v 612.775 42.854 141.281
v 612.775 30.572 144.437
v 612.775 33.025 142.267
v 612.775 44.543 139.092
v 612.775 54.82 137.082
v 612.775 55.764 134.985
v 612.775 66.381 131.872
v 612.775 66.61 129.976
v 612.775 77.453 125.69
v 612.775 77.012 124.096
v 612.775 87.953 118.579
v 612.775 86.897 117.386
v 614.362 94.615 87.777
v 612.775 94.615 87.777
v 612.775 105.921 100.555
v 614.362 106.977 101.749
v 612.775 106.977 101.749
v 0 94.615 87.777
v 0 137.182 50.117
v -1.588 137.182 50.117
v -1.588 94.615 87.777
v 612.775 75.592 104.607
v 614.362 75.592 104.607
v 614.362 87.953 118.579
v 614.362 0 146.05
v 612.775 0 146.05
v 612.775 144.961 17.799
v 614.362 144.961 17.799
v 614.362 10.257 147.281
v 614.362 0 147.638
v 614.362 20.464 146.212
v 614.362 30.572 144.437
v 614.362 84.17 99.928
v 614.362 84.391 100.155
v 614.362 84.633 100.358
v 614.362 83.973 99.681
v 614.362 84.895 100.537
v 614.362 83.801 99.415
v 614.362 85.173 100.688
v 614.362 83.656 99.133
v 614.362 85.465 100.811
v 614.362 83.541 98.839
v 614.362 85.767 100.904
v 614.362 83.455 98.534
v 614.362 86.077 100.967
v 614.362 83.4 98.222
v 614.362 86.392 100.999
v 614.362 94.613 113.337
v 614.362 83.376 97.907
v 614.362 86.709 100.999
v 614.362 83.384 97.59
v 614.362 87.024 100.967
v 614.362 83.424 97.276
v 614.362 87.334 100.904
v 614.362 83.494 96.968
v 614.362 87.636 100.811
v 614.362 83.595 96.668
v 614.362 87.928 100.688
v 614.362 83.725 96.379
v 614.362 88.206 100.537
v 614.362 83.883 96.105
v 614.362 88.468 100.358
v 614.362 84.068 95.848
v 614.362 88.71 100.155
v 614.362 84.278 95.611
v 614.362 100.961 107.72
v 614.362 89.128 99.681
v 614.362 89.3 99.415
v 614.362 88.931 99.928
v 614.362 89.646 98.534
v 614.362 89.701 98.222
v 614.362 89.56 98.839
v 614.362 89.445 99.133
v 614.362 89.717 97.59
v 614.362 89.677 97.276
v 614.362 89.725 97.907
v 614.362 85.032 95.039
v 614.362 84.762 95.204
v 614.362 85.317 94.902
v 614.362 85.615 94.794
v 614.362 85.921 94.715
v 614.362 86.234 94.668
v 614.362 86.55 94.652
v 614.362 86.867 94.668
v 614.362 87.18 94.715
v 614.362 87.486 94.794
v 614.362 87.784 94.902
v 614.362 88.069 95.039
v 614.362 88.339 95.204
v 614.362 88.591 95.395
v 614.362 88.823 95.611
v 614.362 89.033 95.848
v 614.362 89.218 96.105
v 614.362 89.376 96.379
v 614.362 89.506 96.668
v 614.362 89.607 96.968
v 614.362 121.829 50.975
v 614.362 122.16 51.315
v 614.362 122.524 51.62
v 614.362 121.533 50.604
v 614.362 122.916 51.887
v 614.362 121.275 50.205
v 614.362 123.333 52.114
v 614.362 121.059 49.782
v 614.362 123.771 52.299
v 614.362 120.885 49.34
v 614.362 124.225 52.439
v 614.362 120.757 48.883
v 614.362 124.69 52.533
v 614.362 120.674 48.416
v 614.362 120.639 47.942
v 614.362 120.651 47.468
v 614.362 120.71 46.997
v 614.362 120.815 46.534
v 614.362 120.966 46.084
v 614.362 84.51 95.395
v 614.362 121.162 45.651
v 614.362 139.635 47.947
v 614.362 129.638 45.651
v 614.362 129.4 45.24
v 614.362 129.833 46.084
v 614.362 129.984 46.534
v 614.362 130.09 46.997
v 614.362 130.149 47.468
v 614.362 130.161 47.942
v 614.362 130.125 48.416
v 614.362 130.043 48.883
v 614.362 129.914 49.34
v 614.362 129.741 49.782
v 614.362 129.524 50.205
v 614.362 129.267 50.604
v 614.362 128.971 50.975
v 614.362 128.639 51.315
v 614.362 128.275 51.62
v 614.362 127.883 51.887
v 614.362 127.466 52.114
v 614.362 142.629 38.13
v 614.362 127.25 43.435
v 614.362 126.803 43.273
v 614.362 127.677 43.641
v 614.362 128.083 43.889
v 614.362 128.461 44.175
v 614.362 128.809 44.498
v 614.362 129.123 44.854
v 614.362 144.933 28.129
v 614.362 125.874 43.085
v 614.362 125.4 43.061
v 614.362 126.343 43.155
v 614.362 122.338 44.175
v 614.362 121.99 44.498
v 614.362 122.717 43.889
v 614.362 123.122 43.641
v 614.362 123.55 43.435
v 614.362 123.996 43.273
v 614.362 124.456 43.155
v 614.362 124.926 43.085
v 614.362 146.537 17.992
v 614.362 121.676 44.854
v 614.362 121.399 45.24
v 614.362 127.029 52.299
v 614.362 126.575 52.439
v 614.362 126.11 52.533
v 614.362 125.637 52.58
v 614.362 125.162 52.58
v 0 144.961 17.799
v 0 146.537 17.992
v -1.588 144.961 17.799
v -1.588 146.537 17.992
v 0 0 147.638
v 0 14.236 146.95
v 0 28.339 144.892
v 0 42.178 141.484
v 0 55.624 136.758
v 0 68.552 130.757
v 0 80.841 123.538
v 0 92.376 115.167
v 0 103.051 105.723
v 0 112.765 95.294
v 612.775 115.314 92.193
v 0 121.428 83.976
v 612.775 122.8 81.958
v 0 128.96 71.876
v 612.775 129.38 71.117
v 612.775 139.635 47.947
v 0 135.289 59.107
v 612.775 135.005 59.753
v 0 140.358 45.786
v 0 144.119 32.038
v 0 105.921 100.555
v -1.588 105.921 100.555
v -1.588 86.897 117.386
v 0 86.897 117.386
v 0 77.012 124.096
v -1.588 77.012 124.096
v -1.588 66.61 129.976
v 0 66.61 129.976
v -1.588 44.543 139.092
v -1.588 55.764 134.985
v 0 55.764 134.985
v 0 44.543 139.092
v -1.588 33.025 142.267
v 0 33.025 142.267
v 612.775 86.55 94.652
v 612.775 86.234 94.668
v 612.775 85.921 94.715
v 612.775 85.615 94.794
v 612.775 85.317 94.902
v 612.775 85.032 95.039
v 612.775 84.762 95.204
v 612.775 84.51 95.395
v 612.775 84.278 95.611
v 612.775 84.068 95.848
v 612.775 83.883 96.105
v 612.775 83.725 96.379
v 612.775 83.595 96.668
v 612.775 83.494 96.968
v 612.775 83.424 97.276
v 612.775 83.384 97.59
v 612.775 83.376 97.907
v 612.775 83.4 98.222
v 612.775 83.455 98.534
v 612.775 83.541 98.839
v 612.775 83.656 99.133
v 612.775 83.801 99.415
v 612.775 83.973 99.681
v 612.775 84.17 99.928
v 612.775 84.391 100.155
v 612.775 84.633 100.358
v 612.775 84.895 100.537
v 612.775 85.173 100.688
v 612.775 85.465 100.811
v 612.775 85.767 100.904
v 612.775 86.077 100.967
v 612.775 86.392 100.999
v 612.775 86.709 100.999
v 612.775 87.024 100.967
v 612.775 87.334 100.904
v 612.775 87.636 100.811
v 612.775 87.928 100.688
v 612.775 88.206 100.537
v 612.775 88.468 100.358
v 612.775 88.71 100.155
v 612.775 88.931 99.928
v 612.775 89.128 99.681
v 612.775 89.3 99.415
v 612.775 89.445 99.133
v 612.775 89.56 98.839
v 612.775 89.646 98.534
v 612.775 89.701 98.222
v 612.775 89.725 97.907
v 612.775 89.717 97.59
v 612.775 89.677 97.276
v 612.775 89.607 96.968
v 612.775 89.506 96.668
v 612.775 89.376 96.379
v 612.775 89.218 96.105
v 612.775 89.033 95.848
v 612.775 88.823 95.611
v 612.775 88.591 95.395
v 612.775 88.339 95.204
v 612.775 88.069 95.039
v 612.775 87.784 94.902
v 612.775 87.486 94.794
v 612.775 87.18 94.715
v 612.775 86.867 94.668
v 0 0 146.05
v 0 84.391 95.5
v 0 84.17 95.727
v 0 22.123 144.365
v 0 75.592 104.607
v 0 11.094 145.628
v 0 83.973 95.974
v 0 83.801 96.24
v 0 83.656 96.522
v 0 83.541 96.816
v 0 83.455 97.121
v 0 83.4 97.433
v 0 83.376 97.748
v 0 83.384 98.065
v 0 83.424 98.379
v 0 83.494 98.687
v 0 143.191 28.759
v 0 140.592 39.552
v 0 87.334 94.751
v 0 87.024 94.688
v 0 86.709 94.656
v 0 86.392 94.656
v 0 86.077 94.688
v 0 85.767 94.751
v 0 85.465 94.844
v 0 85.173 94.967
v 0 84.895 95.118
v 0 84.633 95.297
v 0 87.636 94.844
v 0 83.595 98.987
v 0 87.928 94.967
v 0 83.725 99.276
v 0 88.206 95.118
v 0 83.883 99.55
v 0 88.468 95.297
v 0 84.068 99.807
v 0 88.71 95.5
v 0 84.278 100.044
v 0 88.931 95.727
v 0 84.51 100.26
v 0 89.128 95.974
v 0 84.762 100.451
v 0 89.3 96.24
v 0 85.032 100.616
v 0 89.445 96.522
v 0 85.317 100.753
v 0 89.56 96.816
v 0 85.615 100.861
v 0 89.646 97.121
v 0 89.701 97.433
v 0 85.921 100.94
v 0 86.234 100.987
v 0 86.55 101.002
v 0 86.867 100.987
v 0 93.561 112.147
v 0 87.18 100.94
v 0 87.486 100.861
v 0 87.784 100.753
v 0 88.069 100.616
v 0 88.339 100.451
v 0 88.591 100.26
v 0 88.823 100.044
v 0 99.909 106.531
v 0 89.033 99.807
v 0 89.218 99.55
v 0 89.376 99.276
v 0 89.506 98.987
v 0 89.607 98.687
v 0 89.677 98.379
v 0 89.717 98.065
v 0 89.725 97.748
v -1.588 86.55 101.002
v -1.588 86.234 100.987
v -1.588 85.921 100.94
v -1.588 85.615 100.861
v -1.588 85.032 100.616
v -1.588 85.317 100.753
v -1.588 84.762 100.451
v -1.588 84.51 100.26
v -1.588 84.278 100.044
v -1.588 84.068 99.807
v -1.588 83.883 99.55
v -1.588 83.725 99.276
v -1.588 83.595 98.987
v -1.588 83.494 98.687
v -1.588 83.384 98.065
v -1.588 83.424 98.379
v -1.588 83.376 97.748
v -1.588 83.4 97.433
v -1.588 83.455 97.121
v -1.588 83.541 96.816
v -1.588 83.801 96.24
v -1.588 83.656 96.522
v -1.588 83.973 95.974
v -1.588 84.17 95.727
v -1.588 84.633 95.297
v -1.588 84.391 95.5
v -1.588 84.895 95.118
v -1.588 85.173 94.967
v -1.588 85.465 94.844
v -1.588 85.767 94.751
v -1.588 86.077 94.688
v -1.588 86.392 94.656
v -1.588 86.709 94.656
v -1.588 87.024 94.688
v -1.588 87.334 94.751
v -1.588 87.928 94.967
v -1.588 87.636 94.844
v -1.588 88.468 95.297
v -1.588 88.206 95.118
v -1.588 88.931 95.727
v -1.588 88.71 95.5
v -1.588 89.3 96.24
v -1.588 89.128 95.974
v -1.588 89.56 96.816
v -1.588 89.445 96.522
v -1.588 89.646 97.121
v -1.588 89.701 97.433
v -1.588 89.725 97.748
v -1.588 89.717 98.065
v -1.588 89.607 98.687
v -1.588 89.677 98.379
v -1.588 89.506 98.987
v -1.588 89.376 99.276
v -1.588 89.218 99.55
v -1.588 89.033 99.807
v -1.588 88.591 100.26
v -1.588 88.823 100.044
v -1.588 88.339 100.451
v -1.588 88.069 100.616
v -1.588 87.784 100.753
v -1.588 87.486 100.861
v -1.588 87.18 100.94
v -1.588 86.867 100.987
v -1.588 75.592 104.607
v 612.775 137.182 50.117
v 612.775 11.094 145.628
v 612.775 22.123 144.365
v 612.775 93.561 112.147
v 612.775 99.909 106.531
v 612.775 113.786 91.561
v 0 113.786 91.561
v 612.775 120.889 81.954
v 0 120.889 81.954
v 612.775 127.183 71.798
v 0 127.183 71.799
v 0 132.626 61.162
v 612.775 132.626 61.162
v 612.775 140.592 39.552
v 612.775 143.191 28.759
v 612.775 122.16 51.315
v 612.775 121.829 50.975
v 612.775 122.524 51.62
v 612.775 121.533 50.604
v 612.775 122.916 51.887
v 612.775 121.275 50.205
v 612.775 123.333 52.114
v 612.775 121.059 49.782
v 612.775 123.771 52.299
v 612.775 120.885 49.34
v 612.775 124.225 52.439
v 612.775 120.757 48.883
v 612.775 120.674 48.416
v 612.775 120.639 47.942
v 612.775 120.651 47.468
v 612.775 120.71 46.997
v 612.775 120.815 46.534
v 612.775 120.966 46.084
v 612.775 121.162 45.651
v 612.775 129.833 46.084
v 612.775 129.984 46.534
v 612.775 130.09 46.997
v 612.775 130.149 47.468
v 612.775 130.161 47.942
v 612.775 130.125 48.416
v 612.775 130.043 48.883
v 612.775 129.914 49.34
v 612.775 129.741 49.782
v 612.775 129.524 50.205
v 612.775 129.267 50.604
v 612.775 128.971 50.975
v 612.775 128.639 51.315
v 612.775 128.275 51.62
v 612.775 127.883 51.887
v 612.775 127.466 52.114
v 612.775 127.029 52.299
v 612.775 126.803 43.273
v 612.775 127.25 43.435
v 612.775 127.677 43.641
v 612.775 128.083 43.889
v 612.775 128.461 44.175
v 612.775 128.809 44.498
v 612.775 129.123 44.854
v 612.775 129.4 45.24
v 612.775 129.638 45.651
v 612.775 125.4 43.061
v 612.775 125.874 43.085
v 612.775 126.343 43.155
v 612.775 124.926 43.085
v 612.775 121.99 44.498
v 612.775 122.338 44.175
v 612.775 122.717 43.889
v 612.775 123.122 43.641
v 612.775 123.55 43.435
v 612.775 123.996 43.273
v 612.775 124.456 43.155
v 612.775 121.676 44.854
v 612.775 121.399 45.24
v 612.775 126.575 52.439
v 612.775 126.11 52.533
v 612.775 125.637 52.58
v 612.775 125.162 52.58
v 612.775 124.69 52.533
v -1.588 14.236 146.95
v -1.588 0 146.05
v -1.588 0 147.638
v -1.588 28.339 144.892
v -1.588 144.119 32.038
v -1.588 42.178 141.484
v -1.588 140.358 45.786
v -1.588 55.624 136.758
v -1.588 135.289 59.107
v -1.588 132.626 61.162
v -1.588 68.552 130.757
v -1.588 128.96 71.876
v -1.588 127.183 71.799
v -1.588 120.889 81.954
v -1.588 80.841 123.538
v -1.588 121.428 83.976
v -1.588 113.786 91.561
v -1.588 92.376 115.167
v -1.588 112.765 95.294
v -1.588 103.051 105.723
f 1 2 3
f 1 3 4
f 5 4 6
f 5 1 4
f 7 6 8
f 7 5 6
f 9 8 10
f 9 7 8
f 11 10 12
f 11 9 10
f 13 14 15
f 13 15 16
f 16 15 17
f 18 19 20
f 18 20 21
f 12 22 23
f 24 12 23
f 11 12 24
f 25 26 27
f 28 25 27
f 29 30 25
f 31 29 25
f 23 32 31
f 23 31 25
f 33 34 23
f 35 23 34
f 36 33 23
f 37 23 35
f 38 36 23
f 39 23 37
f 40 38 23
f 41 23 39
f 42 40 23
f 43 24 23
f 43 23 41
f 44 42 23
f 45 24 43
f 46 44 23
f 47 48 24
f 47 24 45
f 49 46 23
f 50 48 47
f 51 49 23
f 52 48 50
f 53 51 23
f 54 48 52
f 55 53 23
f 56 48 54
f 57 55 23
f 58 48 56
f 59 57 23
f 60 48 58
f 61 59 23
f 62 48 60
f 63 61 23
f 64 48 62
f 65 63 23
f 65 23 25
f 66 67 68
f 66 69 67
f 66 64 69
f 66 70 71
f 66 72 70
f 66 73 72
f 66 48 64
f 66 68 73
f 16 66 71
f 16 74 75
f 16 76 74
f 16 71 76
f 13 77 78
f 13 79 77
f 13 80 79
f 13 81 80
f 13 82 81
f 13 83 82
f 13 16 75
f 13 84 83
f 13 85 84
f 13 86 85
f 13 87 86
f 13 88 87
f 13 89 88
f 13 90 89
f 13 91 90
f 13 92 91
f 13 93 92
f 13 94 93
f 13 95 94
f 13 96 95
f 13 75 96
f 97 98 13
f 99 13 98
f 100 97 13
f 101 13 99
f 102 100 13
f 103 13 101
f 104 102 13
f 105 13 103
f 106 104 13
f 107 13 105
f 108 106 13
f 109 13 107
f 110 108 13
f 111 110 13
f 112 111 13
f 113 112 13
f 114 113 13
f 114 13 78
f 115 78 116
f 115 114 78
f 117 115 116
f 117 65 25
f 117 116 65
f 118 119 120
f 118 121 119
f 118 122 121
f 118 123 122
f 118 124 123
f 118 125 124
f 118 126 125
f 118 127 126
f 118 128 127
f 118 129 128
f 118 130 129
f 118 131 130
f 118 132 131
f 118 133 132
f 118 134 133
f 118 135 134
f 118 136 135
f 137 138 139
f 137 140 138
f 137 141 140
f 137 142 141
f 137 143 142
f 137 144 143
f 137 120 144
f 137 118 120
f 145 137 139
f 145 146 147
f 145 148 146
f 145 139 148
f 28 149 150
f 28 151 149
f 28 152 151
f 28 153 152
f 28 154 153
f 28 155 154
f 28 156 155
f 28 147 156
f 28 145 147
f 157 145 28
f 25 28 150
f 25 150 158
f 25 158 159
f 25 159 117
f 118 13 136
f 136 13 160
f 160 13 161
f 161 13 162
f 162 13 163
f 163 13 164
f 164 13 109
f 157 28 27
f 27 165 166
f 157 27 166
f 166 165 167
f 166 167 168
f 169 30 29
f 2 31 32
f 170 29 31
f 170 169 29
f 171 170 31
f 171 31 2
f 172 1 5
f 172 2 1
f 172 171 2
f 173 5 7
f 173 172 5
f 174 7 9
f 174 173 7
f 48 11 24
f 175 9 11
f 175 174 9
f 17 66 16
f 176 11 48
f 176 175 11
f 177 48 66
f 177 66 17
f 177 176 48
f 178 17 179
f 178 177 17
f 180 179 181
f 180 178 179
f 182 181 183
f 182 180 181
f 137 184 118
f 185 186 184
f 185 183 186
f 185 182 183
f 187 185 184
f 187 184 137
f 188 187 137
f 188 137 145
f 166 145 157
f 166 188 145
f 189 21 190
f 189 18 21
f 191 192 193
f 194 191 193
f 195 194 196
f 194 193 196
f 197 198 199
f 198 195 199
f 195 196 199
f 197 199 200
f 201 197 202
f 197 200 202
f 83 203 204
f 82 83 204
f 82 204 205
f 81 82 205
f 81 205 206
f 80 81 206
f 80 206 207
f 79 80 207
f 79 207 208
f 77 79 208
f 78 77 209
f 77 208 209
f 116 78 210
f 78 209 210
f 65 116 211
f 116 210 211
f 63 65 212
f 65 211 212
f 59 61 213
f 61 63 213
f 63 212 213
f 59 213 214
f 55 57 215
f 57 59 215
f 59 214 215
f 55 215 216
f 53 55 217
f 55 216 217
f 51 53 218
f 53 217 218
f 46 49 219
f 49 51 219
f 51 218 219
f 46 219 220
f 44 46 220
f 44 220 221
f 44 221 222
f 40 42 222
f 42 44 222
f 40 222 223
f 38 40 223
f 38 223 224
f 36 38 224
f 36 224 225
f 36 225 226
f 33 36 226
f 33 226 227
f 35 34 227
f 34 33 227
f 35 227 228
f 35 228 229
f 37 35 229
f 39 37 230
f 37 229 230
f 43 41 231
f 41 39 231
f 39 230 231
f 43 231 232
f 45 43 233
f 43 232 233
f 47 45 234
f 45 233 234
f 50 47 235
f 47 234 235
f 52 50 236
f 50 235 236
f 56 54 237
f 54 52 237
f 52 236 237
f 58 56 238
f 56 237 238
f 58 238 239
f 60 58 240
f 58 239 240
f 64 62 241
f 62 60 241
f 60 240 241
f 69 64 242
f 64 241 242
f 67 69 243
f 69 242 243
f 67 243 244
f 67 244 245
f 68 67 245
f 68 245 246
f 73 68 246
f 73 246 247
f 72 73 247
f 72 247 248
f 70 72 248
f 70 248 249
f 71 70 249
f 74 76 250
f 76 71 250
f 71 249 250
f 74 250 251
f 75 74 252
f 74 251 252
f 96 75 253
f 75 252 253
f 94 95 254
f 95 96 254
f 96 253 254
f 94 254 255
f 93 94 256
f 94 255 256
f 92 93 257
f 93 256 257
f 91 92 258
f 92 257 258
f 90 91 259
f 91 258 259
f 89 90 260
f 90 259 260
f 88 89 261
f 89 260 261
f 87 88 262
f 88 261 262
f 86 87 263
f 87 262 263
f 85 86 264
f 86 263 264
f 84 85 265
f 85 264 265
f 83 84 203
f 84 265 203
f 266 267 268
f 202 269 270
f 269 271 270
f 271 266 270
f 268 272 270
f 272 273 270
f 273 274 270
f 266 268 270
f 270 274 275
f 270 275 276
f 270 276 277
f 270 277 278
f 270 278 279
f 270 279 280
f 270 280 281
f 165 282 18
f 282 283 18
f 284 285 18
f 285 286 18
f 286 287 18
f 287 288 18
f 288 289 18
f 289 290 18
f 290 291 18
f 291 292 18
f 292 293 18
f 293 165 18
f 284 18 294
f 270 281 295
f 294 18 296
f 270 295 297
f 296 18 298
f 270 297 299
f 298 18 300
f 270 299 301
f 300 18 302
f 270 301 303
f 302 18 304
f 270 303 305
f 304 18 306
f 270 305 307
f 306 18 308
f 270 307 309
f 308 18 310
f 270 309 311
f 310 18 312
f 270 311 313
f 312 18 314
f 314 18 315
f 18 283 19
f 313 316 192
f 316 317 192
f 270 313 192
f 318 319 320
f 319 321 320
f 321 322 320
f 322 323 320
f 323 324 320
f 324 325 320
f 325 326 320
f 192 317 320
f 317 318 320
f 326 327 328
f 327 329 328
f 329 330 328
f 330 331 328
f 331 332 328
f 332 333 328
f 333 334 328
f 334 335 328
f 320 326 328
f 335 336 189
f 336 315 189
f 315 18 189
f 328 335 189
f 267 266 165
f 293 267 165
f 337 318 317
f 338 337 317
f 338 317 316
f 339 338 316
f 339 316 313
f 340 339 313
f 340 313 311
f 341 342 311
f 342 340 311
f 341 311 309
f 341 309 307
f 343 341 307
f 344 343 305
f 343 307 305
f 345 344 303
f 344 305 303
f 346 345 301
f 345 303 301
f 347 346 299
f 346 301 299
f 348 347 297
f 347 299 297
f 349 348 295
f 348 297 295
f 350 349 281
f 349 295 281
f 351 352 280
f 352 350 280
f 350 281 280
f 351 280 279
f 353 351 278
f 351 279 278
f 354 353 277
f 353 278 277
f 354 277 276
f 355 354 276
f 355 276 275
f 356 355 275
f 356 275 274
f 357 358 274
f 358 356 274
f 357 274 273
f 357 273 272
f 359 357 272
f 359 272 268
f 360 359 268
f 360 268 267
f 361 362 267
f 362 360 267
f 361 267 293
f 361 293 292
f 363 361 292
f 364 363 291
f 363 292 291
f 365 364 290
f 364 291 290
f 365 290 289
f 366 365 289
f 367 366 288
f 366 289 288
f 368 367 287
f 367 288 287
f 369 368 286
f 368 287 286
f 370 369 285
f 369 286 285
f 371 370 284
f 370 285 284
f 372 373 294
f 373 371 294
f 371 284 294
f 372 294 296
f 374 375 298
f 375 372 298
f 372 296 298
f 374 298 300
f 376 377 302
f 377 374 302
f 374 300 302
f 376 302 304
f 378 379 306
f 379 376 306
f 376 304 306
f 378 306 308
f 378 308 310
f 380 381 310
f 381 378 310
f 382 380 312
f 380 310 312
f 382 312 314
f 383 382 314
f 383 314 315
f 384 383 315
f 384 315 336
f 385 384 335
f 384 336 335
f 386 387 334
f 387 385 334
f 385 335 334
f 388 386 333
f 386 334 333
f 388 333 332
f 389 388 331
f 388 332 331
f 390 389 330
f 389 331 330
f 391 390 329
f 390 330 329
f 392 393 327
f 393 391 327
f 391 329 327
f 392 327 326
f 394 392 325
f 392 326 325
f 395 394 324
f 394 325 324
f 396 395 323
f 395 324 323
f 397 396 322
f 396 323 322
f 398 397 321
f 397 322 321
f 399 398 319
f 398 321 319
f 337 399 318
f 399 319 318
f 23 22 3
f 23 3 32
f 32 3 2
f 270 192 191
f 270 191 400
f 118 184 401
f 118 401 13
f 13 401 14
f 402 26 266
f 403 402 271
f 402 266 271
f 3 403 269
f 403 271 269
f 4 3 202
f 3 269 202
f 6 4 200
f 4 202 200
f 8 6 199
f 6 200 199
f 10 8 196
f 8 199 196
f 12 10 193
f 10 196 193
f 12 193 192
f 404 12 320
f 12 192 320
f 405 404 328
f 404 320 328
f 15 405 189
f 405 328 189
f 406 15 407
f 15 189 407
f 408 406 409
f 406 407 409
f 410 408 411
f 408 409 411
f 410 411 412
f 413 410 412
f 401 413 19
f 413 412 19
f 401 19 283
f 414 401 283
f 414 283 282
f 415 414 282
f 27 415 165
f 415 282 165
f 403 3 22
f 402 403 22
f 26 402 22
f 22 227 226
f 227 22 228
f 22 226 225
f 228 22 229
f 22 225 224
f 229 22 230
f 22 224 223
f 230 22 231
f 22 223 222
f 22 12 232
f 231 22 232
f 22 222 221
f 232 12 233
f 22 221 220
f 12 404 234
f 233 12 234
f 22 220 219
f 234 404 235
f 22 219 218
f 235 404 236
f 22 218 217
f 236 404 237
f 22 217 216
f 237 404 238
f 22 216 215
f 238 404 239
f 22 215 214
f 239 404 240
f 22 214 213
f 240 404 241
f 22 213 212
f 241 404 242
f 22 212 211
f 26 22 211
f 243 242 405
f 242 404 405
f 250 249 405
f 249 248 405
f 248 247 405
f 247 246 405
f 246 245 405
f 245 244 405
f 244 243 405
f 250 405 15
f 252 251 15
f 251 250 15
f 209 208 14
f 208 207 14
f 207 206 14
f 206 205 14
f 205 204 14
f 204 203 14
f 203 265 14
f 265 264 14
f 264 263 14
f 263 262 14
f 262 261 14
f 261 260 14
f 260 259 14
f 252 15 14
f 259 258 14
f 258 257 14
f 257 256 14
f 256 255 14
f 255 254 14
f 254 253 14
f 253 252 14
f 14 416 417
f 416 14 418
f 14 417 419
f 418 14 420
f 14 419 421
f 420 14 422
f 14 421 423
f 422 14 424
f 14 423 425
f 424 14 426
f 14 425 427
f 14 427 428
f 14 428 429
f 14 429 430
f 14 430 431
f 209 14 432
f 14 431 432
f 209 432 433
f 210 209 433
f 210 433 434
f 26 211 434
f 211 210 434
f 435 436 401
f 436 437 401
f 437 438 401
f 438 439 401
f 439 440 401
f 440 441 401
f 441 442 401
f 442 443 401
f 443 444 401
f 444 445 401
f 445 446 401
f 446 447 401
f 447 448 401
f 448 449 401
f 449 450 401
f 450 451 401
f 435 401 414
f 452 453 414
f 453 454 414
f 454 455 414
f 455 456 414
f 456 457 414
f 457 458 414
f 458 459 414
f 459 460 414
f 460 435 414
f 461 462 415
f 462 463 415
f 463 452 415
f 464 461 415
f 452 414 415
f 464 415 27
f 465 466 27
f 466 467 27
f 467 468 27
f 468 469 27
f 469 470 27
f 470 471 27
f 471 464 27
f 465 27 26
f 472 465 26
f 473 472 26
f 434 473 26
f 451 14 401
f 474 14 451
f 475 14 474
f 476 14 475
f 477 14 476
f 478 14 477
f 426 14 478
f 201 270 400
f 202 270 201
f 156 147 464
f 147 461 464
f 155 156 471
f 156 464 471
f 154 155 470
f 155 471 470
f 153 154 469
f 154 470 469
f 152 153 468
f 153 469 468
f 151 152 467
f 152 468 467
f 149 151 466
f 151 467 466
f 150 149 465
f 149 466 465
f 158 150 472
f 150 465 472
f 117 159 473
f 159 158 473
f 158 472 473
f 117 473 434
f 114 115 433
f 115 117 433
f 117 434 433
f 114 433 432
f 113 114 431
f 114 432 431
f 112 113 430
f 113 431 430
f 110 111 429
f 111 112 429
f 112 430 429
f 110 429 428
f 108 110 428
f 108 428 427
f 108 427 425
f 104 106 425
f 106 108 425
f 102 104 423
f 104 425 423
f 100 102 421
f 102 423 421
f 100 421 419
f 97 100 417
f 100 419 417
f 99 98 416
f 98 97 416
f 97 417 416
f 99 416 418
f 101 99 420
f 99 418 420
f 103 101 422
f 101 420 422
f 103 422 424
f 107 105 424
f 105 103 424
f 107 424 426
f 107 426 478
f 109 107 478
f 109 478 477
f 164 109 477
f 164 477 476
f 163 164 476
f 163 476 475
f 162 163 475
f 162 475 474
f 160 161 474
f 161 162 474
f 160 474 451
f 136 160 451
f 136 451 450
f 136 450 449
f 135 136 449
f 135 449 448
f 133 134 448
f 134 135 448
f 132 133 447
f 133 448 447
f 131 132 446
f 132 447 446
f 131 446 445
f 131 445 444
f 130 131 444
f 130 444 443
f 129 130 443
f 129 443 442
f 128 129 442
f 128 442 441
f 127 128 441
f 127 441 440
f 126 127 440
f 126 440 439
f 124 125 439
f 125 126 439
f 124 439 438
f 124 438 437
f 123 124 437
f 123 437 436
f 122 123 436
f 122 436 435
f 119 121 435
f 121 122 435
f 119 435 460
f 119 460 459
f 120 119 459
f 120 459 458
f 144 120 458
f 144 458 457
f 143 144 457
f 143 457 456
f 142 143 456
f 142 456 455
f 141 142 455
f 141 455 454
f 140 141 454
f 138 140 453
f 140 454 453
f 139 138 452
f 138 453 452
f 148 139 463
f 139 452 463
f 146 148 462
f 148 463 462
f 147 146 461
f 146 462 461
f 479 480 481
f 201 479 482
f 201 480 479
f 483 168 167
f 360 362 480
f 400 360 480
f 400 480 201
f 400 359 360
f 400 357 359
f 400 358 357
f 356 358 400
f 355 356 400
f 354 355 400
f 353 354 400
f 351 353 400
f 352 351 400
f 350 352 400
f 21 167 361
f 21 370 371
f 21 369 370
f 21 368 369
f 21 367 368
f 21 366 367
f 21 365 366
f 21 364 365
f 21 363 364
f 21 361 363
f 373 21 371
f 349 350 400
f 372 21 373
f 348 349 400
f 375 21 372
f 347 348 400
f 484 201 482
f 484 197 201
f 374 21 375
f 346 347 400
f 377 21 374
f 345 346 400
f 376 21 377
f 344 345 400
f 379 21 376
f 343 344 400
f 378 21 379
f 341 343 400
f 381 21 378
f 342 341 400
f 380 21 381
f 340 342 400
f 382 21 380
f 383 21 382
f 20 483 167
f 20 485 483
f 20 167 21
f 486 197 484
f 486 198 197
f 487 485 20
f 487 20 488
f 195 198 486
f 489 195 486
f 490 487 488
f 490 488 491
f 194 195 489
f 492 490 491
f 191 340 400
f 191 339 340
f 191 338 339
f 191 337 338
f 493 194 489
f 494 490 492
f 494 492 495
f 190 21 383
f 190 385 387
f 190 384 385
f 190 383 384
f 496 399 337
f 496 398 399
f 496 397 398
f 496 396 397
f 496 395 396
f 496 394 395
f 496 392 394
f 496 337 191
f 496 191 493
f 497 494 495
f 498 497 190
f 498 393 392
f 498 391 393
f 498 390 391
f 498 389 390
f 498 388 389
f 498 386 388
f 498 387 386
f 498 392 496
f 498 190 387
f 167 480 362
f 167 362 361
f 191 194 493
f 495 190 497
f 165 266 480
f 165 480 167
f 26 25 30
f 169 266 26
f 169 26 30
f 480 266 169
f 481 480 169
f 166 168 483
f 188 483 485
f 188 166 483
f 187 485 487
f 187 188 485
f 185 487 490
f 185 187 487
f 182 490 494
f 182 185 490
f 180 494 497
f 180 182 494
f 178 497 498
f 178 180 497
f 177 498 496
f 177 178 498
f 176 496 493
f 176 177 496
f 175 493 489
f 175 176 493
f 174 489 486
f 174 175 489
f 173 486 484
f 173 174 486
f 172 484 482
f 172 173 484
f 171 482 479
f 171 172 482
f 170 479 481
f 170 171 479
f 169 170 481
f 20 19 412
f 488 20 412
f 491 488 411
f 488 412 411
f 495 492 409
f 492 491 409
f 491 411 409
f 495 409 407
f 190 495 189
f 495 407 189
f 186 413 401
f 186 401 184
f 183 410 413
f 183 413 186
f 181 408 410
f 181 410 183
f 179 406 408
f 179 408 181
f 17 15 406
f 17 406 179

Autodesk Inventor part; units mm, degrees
ref_plane "YZ Plane" through (0, 0, 0) normal (1, 0, 0) x (0, 1, 0)
ref_plane "XZ Plane" through (0, 0, 0) normal (0, 1, 0) x (-1, 0, 0)
ref_plane "XY Plane" through (0, 0, 0) normal (0, 0, 1) x (1, 0, 0)
sketch "Sketch1" plane through (0, 0, 0) normal (1, 0, 0) x (0, 1, 0)
  arc A0 (144.9614, 17.799) -> (0, 146.05) centre (0, 0) ccw
  line L0 (0, 0) -> (144.9614, 17.799) construction
  line L1 (0, 0) -> (0, 146.05) construction
  arc A1 (146.537, 17.9925) -> (0, 147.6375) centre (0, 0) ccw
  line L2 (0, 146.05) -> (0, 147.6375)
  line L3 (144.9614, 17.799) -> (146.537, 17.9925)
  dimension "d0" = 146.05
  dimension "d1" = 83
  dimension "d2" = 1.5875
extrude "Extrusion1" add sketch "Sketch1" along normal blind 612.775
sketch "Sketch2" plane through (612.775, 0, 0) normal (1, 0, 0) x (0, 0, -1)
  arc A0 (-17.799, 144.9614) -> (-146.05, 0) centre (0, 0) ccw construction
  line L0 (-146.05, 0) -> (0, 0) construction
  line L1 (-17.799, 144.9614) -> (0, 0) construction
  line L2 (0, 0) -> (-109.385, 96.7757) construction
  circle A1 centre (-97.8275, 86.5505) radius 3.175
  arc A2 (-17.9925, 146.537) -> (-147.6375, 0) centre (0, 0) ccw projected
  line L3 (-146.05, 0) -> (-17.799, 144.9614)
  line L4 (-47.9468, 139.635) -> (-87.7768, 94.6153)
  line L5 (-87.7768, 94.6153) -> (-101.7488, 106.9767)
  line L6 (-104.6074, 75.5919) -> (-118.5794, 87.9532)
  line L7 (-89.4123, 96.0622) -> (-106.2428, 77.0388) construction
  line L8 (-87.7768, 94.6153) -> (-104.6074, 75.5919) construction
  line L9 (-104.6074, 75.5919) -> (-144.4374, 30.5722)
  arc A3 (-101.7488, 106.9767) -> (-118.5794, 87.9532) centre (0, 0) ccw
  arc A4 (-144.4374, 30.5722) -> (-147.6375, 0) centre (0, 0) ccw
  line L10 (-147.6375, 0) -> (-146.05, 0) projected
  line L11 (-146.05, 0) -> (-147.6375, 0)
  arc A5 (-17.9925, 146.537) -> (-47.9468, 139.635) centre (0, 0) ccw
  line L12 (-17.799, 144.9614) -> (-17.9925, 146.537) projected
  line L13 (-17.9925, 146.537) -> (-17.799, 144.9614)
  line L14 (-54.9573, 131.7111) -> (-40.6897, 119.0882) construction
  circle A6 centre (-47.8235, 125.3997) radius 4.7625
  dimension "d5" = 6.35
  dimension "d6" = 130.6186
  dimension "d7" = 25.4
  dimension "d8" = 19.05
  dimension "d19" = 62.23
  dimension "d23" = 9.525
extrude "Extrusion2" add sketch "Sketch2" along normal blind 1.5875 contours L12 L3 L10 A2 L9 L6 L5 L4
sketch "Sketch3" plane through (0, 0, 0) normal (-1, 0, 0) x (0, 0, 1)
  arc A0 (146.05, 0) -> (142.2671, 33.0253) centre (0, 0) ccw projected
  line L0 (104.6074, 75.5919) -> (142.2671, 33.0253) projected
  line L1 (117.3859, 86.8973) -> (104.6074, 75.5919) projected
  arc A1 (117.3859, 86.8973) -> (100.5554, 105.9208) centre (0, 0) ccw projected
  line L2 (87.7768, 94.6153) -> (100.5554, 105.9208) projected
  line L3 (50.1171, 137.1819) -> (87.7768, 94.6153) projected
  arc A2 (50.1171, 137.1819) -> (17.799, 144.9614) centre (0, 0) ccw projected
  line L4 (146.05, 0) -> (17.799, 144.9614) projected
  circle A3 centre (97.8275, 86.5505) radius 3.175 projected
  arc A4 (146.05, 0) -> (17.799, 144.9614) centre (0, 0) ccw projected
  line L5 (146.05, 0) -> (147.6375, 0) projected
  arc A5 (147.6375, 0) -> (17.9925, 146.537) centre (0, 0) ccw projected
  line L6 (17.9925, 146.537) -> (17.799, 144.9614) projected
extrude "Extrusion3" add sketch "Sketch3" along normal blind 1.5875 contours L4 A2 L3 L2 A1 L1 L0 A0 | A0 A4 A1 A2 L6 A5 L5
properties part number "Kick Plate"
